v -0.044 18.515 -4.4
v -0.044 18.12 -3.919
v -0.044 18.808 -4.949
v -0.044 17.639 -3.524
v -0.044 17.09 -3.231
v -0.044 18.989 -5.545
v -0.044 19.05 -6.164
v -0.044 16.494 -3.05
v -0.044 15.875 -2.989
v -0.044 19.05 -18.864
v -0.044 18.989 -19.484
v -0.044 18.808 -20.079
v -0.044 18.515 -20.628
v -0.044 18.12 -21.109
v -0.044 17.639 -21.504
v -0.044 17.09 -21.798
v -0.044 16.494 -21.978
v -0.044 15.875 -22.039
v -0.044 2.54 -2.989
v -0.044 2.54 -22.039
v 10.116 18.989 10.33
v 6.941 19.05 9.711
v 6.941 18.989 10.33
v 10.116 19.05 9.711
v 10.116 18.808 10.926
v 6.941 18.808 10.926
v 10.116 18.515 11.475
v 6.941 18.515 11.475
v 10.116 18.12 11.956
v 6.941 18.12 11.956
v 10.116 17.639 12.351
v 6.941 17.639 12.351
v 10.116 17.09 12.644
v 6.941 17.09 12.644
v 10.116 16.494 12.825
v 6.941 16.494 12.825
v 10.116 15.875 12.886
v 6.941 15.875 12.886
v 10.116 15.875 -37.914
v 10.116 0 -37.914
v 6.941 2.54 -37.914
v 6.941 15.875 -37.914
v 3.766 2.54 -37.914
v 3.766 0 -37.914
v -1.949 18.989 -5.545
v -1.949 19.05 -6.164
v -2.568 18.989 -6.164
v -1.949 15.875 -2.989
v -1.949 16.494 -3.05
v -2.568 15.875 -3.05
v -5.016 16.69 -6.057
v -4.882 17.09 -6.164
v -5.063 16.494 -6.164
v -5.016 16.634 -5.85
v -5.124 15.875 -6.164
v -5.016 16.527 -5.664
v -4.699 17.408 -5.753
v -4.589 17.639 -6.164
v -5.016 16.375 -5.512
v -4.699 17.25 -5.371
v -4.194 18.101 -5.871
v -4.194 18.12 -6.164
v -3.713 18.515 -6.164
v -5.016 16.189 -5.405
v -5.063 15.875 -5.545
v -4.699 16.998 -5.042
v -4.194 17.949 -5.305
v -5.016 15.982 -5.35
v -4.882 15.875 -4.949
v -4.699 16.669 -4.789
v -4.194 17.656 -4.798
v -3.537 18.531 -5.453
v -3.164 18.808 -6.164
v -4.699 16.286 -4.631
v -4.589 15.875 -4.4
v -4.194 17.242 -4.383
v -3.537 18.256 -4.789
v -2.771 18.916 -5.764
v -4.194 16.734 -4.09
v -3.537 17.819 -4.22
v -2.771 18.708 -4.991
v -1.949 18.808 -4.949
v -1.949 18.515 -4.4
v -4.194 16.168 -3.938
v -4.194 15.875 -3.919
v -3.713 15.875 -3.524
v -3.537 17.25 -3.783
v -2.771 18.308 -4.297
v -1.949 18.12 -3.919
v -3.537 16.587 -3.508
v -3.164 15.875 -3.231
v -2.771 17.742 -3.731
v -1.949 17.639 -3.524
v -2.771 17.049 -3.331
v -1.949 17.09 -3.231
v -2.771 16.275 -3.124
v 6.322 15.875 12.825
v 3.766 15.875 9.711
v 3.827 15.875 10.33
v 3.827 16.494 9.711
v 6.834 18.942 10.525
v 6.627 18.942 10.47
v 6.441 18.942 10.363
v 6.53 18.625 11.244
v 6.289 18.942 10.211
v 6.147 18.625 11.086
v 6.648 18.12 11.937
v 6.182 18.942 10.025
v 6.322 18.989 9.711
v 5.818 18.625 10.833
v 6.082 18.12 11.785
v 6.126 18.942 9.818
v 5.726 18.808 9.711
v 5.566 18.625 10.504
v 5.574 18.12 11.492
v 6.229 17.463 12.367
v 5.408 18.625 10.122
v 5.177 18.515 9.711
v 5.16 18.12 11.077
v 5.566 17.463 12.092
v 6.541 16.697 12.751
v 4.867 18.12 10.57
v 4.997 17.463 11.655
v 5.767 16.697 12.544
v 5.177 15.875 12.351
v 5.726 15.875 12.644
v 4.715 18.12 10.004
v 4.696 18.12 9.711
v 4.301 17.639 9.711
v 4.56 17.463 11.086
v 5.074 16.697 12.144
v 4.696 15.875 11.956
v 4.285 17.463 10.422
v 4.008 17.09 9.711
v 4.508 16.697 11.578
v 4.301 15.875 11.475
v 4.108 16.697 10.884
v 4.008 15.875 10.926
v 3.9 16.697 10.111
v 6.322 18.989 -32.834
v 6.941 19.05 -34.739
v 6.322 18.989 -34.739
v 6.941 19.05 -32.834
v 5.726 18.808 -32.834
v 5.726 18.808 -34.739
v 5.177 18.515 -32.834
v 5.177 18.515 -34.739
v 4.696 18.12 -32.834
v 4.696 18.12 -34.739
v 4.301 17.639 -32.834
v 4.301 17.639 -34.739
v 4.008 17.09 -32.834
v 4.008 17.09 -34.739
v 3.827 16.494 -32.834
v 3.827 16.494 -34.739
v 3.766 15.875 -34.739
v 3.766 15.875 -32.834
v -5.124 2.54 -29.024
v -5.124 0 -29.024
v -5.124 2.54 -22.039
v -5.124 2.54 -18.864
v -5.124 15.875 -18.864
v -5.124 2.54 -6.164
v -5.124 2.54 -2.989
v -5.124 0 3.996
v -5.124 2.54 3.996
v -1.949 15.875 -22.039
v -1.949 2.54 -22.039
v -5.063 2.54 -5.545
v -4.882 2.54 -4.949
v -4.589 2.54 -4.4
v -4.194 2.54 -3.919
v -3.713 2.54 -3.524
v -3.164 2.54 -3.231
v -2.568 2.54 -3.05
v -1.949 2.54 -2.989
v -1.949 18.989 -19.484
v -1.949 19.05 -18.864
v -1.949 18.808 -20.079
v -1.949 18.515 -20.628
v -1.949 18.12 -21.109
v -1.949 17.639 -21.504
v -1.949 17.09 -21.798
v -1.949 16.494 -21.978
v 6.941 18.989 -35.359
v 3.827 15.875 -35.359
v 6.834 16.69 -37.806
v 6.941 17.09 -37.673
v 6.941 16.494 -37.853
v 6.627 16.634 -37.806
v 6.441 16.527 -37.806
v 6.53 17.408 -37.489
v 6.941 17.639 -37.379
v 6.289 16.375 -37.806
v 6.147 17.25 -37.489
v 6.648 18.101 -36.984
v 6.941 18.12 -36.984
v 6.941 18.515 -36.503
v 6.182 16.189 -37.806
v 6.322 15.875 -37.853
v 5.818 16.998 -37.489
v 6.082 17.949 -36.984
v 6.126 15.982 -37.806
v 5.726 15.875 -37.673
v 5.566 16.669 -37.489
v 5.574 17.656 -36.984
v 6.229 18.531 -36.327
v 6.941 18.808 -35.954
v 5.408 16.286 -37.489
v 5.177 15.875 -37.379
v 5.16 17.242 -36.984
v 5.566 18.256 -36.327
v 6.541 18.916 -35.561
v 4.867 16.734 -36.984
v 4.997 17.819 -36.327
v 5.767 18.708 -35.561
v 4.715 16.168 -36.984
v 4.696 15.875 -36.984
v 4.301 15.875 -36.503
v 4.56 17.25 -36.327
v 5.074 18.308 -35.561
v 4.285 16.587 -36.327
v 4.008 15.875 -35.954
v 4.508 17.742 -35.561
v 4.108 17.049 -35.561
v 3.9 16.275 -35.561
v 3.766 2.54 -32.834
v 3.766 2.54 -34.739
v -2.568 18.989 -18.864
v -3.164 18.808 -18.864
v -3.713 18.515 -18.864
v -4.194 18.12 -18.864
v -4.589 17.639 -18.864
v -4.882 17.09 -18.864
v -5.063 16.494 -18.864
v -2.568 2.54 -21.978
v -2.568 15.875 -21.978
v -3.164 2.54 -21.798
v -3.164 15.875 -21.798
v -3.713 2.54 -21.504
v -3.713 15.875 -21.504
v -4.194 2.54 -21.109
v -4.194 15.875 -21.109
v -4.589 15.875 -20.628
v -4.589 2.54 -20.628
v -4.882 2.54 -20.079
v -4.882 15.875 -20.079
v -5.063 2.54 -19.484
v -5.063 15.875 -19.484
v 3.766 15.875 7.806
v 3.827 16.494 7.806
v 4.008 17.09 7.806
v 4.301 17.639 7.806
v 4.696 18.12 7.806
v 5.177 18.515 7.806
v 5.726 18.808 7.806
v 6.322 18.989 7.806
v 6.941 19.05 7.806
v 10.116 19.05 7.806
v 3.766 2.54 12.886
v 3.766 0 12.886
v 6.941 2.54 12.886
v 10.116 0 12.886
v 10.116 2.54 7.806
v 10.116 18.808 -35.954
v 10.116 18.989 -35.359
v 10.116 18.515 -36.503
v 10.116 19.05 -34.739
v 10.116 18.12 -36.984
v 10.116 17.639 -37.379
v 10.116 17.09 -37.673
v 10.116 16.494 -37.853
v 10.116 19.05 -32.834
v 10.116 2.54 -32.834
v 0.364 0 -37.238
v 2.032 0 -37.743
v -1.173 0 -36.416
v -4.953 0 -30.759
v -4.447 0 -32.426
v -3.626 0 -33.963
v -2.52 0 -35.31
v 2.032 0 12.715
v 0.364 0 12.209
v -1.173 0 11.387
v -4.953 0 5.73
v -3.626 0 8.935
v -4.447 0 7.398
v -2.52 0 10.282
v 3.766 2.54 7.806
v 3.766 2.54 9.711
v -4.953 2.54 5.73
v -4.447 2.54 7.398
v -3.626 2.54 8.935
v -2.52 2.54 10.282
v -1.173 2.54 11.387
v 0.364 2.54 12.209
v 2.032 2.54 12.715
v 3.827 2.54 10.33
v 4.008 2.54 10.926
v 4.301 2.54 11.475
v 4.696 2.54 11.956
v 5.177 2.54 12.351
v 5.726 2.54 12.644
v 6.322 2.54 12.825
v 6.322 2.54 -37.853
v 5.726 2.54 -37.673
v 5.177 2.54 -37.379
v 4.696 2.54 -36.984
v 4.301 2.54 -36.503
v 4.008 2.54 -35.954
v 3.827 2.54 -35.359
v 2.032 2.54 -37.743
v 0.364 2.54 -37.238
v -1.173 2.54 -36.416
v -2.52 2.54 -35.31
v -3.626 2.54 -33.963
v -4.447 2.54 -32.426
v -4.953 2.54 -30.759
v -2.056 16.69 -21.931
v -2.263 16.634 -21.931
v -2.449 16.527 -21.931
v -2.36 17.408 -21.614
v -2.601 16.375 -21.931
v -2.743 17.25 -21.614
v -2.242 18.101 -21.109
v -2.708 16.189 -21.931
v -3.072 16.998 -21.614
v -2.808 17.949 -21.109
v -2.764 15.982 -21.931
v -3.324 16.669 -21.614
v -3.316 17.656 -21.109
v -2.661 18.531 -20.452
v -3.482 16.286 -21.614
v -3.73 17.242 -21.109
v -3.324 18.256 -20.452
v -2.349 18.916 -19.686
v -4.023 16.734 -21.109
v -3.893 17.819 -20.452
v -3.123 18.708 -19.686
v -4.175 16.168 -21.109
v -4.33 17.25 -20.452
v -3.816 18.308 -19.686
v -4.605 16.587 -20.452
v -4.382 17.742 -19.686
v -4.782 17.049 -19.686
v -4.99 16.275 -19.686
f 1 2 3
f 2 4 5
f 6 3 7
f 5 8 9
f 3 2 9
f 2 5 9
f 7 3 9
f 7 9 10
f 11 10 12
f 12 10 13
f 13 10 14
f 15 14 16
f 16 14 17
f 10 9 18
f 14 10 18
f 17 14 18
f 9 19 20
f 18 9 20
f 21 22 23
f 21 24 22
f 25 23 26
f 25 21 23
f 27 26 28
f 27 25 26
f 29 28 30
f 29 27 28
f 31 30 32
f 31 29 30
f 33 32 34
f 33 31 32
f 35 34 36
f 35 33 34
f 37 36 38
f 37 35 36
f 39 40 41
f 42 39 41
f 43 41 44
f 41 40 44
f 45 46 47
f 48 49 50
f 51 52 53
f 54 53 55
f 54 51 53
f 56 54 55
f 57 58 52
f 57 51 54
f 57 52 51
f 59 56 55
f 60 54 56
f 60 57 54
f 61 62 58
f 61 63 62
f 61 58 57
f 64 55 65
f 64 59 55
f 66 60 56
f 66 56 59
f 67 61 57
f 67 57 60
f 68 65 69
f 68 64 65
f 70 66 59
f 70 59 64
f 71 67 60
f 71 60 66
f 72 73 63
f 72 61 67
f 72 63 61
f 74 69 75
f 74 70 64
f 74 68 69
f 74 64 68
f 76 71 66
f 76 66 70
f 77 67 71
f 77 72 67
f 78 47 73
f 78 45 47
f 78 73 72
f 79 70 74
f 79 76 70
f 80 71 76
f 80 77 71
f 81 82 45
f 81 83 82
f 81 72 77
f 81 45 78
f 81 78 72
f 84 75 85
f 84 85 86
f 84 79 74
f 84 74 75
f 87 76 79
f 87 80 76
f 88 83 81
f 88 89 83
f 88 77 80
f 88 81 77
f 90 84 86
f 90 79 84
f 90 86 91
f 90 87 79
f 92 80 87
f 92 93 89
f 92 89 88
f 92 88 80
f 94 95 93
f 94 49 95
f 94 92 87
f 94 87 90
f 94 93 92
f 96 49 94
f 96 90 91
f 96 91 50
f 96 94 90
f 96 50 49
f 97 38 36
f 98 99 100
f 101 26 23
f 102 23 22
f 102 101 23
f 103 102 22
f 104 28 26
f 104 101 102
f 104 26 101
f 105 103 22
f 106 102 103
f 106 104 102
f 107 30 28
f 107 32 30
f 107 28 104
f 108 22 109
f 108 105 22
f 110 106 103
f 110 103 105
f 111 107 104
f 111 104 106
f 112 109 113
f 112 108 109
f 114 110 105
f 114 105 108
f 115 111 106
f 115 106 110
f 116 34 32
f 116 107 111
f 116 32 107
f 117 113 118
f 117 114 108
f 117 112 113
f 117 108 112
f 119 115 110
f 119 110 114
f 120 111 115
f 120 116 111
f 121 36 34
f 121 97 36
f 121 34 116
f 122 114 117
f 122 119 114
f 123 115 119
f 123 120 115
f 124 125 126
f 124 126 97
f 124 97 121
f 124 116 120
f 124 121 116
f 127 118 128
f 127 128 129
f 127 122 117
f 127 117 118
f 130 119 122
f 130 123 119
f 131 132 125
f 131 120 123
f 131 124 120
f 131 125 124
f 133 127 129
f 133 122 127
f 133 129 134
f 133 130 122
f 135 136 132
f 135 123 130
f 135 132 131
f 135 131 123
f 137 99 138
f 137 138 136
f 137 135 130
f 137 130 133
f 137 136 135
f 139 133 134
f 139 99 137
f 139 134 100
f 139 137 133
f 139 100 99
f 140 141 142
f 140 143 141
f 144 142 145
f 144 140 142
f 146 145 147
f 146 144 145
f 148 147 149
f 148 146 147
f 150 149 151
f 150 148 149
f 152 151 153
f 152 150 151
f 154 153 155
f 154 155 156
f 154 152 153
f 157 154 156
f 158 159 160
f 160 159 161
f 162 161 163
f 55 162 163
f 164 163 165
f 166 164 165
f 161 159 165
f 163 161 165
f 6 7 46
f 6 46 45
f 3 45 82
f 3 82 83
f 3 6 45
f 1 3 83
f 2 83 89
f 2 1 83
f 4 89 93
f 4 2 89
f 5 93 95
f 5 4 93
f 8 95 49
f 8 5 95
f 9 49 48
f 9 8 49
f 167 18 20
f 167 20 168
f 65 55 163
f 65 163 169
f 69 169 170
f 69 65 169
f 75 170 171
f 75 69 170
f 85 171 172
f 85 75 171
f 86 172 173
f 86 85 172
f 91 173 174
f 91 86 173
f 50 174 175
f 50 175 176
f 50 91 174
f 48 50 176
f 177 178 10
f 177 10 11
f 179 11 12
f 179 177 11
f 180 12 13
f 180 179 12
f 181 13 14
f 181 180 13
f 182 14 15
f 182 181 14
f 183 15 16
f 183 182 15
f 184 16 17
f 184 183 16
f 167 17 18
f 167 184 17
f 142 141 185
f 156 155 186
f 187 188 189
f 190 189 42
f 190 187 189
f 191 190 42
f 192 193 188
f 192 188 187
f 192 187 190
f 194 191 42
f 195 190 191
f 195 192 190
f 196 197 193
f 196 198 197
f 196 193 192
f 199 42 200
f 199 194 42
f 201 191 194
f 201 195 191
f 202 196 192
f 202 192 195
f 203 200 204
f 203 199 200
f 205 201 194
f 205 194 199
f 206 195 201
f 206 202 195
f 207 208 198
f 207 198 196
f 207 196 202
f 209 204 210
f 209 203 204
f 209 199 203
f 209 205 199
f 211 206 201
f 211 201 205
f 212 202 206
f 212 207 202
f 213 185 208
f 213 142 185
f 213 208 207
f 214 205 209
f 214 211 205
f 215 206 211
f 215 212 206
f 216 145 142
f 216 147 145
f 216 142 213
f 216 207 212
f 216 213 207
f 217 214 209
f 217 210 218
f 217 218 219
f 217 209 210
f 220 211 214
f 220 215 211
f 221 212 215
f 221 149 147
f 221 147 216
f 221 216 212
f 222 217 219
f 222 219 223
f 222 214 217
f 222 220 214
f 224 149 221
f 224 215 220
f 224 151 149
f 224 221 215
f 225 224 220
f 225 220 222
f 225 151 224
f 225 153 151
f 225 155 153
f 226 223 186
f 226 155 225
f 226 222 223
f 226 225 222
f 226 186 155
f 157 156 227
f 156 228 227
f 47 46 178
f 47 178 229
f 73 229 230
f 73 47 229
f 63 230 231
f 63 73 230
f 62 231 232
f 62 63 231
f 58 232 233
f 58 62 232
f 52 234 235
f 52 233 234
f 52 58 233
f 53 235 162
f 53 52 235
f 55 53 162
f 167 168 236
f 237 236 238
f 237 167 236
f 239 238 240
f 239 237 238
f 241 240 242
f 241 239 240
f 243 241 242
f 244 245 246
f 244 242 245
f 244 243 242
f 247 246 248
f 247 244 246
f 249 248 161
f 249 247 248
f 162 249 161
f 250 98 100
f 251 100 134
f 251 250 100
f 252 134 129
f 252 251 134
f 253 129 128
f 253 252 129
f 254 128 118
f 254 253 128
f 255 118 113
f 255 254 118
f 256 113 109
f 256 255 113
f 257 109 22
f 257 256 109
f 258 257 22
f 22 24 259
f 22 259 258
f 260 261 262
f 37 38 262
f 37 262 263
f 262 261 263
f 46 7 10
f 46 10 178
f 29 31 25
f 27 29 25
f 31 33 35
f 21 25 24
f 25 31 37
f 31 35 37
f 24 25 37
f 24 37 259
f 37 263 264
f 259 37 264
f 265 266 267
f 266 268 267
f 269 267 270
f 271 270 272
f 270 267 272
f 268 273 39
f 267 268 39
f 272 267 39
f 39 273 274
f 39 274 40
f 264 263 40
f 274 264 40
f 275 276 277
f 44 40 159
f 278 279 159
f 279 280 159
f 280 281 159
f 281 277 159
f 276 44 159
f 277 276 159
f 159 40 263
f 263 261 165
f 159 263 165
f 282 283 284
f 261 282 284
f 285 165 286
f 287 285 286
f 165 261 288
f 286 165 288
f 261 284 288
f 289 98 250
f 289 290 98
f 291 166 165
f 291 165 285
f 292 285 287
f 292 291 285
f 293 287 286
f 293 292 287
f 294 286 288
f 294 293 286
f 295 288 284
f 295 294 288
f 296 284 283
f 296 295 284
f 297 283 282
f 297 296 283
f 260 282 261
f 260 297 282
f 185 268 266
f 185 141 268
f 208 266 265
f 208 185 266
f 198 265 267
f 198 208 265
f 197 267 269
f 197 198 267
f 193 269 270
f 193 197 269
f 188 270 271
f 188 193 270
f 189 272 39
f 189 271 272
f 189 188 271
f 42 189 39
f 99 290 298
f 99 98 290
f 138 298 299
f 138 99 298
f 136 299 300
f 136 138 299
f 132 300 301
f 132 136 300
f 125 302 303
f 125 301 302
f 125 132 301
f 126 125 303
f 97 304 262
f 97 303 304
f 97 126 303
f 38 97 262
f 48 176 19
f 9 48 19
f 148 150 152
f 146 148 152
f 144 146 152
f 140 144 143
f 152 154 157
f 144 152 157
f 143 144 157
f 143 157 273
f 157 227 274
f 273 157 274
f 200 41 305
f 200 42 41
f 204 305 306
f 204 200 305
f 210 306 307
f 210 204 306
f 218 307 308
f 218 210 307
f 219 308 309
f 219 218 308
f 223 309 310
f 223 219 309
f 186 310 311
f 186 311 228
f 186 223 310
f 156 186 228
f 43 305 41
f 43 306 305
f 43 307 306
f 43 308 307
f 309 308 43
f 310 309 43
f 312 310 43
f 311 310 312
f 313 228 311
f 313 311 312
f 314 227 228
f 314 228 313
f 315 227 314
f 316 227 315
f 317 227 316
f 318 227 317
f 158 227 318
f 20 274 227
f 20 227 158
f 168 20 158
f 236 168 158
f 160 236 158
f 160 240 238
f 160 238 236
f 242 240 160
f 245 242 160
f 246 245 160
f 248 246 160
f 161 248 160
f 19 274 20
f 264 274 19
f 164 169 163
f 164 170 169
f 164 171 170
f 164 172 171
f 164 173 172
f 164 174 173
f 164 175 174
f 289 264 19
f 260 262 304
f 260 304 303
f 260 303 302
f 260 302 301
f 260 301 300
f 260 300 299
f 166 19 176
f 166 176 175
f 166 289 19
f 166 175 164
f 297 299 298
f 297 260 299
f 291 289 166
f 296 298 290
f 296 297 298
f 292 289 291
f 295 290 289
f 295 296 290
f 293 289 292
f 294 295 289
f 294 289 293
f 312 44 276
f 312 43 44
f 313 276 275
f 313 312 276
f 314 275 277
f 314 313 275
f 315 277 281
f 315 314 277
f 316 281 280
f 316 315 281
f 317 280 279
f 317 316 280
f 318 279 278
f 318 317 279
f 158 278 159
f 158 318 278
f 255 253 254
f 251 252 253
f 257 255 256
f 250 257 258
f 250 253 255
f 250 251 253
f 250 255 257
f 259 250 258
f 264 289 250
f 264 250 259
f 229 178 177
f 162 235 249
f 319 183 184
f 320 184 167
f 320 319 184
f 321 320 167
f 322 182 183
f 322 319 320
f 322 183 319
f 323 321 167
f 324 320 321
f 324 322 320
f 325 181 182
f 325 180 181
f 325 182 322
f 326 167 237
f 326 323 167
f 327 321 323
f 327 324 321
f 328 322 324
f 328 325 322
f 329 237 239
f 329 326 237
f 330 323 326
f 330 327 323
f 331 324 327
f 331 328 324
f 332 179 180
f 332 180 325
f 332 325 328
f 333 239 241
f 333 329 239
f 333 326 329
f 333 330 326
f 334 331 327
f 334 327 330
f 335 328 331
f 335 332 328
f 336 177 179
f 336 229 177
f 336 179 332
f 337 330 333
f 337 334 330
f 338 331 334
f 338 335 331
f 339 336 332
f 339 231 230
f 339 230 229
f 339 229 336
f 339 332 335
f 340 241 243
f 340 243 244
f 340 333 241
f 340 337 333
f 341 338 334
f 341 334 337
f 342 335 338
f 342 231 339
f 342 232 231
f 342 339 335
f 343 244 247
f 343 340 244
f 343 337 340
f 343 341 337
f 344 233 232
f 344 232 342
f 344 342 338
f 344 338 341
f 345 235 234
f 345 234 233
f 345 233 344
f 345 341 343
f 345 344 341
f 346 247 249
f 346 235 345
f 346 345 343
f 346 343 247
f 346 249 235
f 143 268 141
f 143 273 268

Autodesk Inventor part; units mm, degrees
ref_plane "YZ Plane" through (0, 0, 0) normal (1, 0, 0) x (0, 1, 0)
ref_plane "XZ Plane" through (0, 0, 0) normal (0, 1, 0) x (-1, 0, 0)
ref_plane "XY Plane" through (0, 0, 0) normal (0, 0, 1) x (1, 0, 0)
sketch "Sketch1" plane through (0, 0, 0) normal (0, 1, 0) x (-1, 0, 0)
  line L0 (5.124, 12.8857) -> (-10.116, 12.8857)
  line L1 (-10.116, 12.8857) -> (-10.116, -37.9143)
  line L2 (-10.116, -37.9143) -> (5.124, -37.9143)
  line L3 (5.124, -37.9143) -> (5.124, 12.8857)
  line L4 (-10.116, 12.8857) -> (-3.766, 12.8857)
  line L5 (-3.766, 12.8857) -> (-3.766, 7.8057)
  line L6 (-3.766, 7.8057) -> (-10.116, 7.8057)
  line L7 (-10.116, 7.8057) -> (-10.116, 12.8857)
  line L8 (-10.116, -37.9143) -> (-3.766, -37.9143)
  line L9 (-3.766, -37.9143) -> (-3.766, -32.8343)
  line L10 (-3.766, -32.8343) -> (-10.116, -32.8343)
  line L11 (-10.116, -32.8343) -> (-10.116, -37.9143)
  line L12 (5.124, -2.9893) -> (0.044, -2.9893)
  line L13 (0.044, -2.9893) -> (0.044, -22.0393)
  line L14 (0.044, -22.0393) -> (5.124, -22.0393)
  line L15 (5.124, -22.0393) -> (5.124, -2.9893)
  point P0 (0, 0)
  dimension "d0" = 15.24
  dimension "d1" = 50.8
  dimension "d2" = 6.35
  dimension "d3" = 5.08
  dimension "d4" = 5.08
  dimension "d8" = 5.08
  dimension "d9" = 19.05
extrude "Extrusion1" add sketch "Sketch1" along normal blind 19.05 contours L5 L6 L1 L0 | L3 L14 L13 L12 | L10 L9 L2 L1
extrude "Extrusion2" add sketch "Sketch1" along normal blind 2.54 contours L3 L12 L13 L14 L2 L9 L10 L1 L6 L5 L0
fillet "Fillet1" radius 8.89 2 edges at (-5.124, 1.27, 12.8857) (-5.124, 1.27, -37.9143)
fillet "Fillet2" radius 3.175 11 edges at (-2.584, 19.05, -2.9893) (-5.124, 19.05, -12.5143) (-5.124, 10.795, -2.9893) (-5.124, 10.795, -22.0393) (-2.584, 19.05, -22.0393) (3.766, 10.795, 12.8857) (3.766, 19.05, 10.3457) (6.941, 19.05, 12.8857) (3.766, 19.05, -35.3743) (6.941, 19.05, -37.9143) (3.766, 10.795, -37.9143)
equation "\"BendRadius\" = Thickness"
equation "\"BendReliefWidth\" = Thickness"
equation "\"BendReliefDepth\" = 0.5 * Thickness"
equation "\"CornerReliefSize\" = 4 * Thickness"
equation "\"MinimumRemnant\" = 2 * Thickness"
equation "\"TransitionRadius\" = BendRadius"
equation "\"JacobiRadiusSize\" = BendRadius"
equation "\"GapSize\" = Thickness"
equation "\"Thickness\" = 3.048"
properties part number "BatteryStopper" material "ABS Plastic"
